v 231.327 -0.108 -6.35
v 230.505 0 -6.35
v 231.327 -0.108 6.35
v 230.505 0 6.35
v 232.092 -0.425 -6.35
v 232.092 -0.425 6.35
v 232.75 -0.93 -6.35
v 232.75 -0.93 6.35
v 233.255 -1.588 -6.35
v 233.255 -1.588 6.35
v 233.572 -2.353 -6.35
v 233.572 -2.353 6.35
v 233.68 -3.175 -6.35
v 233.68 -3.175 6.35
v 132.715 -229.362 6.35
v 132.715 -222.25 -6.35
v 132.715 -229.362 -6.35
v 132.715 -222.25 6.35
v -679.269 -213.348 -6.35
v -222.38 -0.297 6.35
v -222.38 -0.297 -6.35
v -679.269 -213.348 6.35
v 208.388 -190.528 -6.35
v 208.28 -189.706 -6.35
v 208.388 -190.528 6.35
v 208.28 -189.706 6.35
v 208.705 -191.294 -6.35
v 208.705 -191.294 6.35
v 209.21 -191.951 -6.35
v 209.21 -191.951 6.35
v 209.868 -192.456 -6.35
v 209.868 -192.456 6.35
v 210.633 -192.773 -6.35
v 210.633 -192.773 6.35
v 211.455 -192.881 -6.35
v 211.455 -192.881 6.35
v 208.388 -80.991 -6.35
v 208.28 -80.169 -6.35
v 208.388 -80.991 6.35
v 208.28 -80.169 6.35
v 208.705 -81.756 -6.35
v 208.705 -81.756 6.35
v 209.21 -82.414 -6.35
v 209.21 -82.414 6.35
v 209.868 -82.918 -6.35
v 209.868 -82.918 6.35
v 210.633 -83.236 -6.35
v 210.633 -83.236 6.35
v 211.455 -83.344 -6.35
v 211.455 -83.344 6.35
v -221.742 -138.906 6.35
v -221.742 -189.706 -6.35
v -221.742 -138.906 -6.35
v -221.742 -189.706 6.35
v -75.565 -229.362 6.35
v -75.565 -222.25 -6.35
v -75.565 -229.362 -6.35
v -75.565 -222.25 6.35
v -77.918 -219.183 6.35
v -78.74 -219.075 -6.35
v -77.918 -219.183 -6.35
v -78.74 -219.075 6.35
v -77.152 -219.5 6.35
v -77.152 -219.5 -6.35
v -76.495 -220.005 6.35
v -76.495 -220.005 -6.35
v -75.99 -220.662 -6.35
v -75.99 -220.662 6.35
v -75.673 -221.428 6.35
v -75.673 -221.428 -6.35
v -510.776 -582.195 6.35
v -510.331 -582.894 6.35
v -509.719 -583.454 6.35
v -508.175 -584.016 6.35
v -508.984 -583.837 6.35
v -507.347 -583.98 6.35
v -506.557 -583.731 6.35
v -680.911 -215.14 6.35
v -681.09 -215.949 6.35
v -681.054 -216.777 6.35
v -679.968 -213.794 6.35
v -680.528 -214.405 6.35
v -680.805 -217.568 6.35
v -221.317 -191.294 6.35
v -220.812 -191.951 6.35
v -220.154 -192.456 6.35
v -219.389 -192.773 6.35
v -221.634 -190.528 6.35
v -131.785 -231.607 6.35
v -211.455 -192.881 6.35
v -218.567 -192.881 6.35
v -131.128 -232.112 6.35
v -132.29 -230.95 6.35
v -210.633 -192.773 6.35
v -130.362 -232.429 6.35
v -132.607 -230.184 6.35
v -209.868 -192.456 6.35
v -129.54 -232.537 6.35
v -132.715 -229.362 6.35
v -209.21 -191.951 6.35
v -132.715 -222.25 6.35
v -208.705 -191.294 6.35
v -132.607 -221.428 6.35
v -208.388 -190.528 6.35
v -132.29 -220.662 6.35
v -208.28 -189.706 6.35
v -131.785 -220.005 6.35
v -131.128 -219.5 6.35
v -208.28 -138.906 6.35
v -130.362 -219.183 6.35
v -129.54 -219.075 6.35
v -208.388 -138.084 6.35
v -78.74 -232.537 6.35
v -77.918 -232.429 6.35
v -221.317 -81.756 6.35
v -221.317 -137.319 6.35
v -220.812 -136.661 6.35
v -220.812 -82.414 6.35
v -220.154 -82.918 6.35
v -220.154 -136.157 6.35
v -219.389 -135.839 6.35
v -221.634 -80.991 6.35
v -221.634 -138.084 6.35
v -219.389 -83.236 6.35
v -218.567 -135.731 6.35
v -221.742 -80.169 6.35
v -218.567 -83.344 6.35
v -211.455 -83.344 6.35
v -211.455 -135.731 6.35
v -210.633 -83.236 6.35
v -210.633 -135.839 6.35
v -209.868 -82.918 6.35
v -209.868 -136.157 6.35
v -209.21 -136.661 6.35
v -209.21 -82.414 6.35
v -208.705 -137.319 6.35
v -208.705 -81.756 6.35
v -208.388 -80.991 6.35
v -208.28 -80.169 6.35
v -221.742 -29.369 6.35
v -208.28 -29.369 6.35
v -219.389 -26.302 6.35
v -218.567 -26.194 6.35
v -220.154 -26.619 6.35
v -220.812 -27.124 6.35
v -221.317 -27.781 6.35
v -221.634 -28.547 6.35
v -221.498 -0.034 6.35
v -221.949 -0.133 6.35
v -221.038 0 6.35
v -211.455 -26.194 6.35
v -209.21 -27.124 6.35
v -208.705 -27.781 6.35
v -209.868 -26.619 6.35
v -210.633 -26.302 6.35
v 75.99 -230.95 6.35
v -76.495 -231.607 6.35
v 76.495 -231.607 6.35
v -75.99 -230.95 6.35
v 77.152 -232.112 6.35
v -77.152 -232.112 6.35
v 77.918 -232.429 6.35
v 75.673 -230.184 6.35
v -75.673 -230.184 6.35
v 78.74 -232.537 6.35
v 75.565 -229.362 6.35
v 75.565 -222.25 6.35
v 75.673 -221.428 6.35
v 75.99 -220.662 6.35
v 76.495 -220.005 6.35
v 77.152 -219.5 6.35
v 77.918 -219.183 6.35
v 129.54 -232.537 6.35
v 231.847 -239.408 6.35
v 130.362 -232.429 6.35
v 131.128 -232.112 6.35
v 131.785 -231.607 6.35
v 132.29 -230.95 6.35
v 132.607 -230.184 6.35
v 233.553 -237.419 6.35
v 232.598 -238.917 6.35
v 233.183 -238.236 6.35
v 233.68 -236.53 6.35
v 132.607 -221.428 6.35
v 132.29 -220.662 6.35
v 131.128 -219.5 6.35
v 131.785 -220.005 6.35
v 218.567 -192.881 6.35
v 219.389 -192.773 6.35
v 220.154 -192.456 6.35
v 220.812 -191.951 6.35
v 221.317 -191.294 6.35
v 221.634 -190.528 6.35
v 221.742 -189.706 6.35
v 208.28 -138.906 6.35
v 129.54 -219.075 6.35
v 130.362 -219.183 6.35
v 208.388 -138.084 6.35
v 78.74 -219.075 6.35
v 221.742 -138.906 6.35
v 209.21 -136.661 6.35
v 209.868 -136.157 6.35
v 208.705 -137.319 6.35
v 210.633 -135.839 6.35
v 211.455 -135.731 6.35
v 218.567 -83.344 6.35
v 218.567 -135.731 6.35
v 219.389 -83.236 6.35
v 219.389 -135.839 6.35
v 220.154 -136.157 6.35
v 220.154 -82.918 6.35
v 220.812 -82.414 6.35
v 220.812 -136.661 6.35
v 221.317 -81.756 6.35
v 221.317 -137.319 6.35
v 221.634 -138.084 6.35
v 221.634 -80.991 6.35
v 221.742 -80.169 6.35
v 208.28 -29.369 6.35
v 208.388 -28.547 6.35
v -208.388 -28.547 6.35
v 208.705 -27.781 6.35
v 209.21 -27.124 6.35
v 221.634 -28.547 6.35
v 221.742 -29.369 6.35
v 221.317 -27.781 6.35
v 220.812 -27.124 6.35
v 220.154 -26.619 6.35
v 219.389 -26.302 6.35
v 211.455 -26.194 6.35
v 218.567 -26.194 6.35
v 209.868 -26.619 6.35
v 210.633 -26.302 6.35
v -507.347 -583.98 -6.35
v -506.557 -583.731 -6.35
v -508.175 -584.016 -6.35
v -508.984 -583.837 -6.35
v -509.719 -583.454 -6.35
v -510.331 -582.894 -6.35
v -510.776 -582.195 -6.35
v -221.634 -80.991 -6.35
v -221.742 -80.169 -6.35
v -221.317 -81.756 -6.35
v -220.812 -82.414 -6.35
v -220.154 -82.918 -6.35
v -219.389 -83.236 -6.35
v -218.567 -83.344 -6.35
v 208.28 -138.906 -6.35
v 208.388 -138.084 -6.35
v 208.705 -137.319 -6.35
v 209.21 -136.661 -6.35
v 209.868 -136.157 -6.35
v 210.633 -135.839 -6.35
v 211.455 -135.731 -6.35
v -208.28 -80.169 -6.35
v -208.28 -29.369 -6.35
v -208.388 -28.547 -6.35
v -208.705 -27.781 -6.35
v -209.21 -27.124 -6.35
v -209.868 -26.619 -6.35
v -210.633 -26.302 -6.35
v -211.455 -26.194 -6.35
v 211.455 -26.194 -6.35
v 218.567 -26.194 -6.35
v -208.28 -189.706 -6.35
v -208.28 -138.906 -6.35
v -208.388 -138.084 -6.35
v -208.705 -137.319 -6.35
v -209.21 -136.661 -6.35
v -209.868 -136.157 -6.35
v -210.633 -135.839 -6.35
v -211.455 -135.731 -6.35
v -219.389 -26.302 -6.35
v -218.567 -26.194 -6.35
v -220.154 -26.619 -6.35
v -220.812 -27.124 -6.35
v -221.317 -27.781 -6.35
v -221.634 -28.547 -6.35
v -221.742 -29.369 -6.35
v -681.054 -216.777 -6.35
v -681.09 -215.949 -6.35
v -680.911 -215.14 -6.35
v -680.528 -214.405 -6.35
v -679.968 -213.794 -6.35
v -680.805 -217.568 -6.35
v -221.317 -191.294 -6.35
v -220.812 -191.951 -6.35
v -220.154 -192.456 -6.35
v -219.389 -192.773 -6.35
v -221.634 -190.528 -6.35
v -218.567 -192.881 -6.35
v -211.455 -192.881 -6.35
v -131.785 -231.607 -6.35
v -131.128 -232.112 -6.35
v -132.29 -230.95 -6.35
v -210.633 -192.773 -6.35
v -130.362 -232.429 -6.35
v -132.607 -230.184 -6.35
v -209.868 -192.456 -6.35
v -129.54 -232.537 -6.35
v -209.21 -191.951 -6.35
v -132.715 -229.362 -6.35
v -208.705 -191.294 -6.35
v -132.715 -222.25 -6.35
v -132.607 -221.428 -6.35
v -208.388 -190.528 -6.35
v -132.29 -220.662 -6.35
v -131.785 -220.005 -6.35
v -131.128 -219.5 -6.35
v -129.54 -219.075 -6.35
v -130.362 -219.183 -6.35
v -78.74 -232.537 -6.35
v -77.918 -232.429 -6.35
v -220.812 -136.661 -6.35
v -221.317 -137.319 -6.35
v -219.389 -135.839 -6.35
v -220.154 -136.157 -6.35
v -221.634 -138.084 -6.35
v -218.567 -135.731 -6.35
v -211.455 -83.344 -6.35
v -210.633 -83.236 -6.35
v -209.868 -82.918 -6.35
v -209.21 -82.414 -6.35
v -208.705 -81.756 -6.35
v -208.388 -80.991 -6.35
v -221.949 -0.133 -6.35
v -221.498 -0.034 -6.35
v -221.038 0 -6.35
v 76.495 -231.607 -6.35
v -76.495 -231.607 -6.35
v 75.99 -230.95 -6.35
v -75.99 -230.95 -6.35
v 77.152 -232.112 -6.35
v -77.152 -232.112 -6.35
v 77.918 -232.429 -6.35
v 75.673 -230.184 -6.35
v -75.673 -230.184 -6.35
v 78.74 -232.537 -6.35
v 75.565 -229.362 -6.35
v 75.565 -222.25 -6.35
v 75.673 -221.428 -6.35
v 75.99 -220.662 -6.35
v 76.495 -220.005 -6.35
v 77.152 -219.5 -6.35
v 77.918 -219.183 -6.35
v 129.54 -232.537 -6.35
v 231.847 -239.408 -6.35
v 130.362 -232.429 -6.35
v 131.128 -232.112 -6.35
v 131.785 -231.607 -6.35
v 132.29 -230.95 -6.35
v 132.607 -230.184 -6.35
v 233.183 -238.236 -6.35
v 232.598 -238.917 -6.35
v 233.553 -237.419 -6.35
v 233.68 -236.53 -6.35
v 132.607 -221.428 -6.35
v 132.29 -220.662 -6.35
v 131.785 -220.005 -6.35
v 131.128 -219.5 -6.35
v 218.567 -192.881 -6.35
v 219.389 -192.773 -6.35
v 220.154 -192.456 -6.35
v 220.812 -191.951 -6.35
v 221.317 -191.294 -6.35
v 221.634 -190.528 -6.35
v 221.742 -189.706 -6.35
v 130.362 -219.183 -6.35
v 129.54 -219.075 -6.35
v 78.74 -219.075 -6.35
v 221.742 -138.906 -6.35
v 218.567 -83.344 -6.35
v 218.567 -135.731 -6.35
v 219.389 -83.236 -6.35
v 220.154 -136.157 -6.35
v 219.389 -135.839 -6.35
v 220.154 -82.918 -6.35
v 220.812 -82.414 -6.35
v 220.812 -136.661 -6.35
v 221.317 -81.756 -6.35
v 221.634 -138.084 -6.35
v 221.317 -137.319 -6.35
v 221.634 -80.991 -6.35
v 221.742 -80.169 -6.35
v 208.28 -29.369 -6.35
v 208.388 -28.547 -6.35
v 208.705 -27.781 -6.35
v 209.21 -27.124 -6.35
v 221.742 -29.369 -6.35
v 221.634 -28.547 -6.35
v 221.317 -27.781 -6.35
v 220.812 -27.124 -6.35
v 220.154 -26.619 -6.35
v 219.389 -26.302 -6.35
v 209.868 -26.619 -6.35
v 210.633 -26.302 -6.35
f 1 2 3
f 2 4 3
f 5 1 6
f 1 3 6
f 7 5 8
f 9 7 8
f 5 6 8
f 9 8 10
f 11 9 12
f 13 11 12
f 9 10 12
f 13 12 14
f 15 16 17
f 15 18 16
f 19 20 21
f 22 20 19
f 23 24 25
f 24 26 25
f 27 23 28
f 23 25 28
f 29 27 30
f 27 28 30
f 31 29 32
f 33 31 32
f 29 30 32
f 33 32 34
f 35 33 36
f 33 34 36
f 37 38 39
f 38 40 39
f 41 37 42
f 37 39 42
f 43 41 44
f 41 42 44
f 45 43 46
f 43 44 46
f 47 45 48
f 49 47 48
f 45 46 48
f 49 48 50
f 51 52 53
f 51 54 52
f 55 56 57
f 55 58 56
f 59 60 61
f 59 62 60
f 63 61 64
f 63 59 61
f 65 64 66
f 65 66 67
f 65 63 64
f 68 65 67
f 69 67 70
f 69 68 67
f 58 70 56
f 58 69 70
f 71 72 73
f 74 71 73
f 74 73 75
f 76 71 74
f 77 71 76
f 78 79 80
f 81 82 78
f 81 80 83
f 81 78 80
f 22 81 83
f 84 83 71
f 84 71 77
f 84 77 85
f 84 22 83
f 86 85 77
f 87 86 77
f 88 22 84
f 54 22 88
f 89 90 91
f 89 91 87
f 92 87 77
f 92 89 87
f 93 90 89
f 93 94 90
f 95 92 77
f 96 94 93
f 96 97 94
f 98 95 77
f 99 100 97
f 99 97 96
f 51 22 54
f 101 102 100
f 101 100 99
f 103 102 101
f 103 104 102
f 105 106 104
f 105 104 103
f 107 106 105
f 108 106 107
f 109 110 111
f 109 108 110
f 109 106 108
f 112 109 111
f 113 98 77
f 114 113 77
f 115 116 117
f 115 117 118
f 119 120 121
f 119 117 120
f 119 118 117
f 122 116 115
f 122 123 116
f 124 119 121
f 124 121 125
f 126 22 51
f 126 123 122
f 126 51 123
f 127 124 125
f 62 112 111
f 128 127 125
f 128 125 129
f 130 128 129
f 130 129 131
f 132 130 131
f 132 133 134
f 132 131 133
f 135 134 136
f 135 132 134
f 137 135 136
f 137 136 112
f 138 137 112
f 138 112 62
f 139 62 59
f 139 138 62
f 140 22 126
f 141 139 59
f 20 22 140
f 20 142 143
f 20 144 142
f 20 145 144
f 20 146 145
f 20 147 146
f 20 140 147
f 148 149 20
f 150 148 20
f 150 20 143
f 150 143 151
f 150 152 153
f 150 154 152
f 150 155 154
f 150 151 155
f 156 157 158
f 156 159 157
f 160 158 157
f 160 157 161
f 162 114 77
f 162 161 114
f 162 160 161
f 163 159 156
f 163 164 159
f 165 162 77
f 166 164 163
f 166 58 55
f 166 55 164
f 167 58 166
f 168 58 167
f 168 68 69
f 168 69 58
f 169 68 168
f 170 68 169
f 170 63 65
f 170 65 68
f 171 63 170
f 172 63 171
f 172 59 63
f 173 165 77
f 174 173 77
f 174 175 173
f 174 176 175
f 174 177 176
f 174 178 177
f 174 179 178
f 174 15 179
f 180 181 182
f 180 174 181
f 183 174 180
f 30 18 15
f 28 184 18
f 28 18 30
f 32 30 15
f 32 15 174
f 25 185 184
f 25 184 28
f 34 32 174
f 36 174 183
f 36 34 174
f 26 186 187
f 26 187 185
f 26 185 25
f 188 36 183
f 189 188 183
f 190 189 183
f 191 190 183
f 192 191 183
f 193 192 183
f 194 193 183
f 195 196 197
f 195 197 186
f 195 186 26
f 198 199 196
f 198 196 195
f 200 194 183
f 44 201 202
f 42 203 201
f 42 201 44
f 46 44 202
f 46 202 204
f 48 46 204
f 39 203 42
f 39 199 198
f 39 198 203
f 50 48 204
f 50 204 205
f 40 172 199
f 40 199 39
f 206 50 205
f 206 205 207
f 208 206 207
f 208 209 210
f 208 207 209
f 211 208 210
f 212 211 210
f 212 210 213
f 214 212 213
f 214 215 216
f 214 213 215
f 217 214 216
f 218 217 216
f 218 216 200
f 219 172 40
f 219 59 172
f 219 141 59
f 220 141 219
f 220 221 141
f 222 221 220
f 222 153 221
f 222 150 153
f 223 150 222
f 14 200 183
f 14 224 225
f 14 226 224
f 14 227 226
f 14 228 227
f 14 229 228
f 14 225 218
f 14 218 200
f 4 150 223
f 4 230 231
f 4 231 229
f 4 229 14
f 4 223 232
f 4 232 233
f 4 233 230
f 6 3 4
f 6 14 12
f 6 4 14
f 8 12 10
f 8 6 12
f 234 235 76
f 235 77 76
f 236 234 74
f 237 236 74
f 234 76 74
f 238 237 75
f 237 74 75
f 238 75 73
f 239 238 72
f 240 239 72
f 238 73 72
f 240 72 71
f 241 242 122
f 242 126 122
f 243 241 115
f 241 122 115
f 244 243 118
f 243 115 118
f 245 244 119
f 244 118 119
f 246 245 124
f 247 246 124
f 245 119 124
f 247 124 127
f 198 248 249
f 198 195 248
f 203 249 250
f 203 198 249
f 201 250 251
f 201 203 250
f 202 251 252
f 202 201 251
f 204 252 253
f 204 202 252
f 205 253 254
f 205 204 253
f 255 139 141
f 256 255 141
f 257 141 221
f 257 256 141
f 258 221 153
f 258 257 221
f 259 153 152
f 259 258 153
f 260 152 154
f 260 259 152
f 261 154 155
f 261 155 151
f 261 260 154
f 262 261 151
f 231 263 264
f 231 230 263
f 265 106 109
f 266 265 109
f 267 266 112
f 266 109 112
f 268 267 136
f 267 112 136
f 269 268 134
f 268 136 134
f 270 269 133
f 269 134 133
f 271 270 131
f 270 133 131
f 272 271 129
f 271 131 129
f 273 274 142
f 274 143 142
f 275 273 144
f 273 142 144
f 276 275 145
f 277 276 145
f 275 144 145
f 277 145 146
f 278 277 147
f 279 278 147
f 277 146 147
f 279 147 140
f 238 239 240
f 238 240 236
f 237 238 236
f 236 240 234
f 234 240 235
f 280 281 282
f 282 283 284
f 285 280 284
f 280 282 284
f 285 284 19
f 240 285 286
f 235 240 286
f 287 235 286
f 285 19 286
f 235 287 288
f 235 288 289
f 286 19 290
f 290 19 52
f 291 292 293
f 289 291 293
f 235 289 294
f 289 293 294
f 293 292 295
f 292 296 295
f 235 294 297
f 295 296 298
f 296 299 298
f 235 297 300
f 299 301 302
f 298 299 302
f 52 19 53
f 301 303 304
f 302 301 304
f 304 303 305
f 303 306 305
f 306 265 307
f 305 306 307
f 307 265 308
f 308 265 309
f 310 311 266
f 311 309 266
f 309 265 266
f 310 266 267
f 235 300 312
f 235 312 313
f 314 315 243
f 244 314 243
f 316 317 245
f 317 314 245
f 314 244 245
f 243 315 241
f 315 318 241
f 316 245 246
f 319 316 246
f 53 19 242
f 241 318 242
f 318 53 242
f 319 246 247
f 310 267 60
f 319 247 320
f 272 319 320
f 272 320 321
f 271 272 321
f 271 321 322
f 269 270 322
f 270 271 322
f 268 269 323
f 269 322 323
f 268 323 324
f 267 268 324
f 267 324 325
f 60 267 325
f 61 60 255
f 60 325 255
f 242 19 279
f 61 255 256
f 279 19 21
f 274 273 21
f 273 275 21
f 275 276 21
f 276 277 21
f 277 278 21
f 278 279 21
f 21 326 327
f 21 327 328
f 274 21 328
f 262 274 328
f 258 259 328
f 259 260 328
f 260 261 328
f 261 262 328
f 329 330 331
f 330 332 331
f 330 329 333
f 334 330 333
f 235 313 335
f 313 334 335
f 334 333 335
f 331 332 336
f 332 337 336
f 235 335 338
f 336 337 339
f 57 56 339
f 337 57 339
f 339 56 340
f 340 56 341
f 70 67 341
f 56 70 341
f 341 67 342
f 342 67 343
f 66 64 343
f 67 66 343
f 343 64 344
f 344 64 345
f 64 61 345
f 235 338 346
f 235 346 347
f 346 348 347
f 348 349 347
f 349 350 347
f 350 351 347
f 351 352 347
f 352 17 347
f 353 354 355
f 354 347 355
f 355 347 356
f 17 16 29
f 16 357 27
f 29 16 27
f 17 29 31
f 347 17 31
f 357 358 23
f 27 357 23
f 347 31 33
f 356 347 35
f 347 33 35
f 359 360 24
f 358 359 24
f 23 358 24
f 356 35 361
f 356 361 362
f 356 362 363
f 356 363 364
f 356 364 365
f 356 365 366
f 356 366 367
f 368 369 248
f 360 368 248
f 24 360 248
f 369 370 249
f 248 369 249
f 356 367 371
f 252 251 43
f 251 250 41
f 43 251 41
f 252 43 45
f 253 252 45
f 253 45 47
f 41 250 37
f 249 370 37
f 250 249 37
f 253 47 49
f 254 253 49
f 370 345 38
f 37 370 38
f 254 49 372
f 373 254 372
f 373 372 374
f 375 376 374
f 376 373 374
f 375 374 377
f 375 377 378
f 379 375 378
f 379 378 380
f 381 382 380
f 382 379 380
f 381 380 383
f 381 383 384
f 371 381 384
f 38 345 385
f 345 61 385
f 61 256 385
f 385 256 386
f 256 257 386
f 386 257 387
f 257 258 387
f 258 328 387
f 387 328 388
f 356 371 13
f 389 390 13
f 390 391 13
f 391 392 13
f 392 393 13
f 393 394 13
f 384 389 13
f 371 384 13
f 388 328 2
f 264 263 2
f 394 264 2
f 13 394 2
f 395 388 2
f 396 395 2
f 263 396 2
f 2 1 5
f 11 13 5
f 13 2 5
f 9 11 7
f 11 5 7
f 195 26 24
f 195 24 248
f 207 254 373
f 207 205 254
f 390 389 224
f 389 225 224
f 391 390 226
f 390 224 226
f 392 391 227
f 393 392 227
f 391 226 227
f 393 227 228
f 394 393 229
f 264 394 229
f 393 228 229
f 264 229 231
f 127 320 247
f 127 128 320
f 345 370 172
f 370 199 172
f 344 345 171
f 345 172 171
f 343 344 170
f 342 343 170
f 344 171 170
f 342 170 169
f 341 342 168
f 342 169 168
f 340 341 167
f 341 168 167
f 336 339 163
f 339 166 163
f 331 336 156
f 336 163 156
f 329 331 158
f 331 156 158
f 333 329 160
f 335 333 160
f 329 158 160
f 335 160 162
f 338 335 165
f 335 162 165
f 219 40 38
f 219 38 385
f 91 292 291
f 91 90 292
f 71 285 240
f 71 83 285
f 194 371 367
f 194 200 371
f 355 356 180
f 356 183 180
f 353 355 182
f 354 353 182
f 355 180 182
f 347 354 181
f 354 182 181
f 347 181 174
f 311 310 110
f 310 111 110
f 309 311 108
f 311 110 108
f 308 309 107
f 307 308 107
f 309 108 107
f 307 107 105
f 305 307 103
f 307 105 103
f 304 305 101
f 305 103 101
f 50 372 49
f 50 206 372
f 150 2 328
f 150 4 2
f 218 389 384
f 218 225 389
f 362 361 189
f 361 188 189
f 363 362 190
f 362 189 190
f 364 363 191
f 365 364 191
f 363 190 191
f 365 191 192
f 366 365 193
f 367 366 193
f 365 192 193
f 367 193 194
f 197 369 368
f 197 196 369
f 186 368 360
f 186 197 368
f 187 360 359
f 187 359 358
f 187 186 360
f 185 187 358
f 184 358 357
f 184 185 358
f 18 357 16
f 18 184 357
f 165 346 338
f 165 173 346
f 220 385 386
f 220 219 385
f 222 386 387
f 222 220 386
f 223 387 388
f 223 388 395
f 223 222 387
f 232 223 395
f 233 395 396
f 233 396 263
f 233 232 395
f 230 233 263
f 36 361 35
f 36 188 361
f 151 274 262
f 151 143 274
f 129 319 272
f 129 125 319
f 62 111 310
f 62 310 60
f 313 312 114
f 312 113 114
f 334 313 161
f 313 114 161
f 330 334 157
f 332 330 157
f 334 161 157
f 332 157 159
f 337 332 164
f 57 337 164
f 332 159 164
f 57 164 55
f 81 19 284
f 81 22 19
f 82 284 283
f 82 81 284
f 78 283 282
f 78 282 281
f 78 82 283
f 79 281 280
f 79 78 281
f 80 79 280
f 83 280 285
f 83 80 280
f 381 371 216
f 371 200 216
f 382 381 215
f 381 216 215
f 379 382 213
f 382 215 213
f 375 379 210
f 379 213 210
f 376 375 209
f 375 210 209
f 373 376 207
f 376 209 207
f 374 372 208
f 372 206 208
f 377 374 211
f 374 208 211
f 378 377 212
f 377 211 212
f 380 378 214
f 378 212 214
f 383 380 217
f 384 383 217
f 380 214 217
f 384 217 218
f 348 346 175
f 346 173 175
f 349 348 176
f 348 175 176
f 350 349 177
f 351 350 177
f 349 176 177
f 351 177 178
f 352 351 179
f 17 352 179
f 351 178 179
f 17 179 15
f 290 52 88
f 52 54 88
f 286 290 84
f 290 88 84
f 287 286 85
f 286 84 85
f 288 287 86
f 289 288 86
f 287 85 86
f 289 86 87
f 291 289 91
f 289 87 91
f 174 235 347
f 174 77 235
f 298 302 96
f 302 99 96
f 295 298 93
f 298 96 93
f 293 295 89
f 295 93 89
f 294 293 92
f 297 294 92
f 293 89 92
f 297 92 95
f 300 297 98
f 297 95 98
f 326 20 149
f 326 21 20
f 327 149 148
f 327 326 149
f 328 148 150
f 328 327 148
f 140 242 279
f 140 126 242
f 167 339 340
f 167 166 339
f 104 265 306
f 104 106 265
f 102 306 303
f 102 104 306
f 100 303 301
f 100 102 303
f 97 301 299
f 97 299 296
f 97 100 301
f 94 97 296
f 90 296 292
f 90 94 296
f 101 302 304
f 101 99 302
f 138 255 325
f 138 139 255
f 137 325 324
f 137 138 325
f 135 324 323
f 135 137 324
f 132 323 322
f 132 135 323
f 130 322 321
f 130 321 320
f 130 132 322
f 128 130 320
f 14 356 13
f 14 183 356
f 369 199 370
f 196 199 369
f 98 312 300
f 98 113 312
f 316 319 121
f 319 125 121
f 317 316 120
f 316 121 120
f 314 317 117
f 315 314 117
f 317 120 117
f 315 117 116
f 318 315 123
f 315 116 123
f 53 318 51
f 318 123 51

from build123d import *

# Parameters (mm, degrees)
SKETCH1_W           = 416.56
SKETCH1_H           = 219.075
BOSS_EXTRUDE1_DEPTH = 6.35
BOSS_EXTRUDE2_DEPTH = 6.35
FILLET1_R           = 3.175


with BuildPart() as part:
    # Sketch1 → Boss-Extrude1 (new body, symmetric)
    with BuildSketch(Plane.XY):
        with Locations((0, -109.5375)):
            Rectangle(SKETCH1_W, SKETCH1_H)
    extrude(amount=BOSS_EXTRUDE1_DEPTH, both=True)

    # Sketch2 → Boss-Extrude2 (add, symmetric)
    with BuildSketch(Plane.XY):
        Polygon((-221.742, 0), (-682.146355815, -214.690076964), (-509.434106267, -585.072691377), (233.68, -238.552892741), (233.68, 0), (208.28, 0), (208.28, -26.19375), (221.742, -26.19375), (221.742, -83.34375), (208.28, -83.34375), (208.28, -135.73125), (221.742, -135.73125), (221.742, -192.88125), (208.28, -192.88125), (208.28, -219.075), (132.715, -219.075), (132.715, -232.537), (75.565, -232.537), (75.565, -219.075), (-75.565, -219.075), (-75.565, -232.537), (-132.715, -232.537), (-132.715, -219.075), (-208.28, -219.075), (-208.28, -192.88125), (-221.742, -192.88125), (-221.742, -135.73125), (-208.28, -135.73125), (-208.28, -83.34375), (-221.742, -83.34375), (-221.742, -26.19375), (-208.28, -26.19375), (-208.28, 0), align=None)
    extrude(amount=BOSS_EXTRUDE2_DEPTH, both=True)

    # Fillet1
    fillet1_edges = [part.edges().sort_by_distance(p)[0] for p in [
        (-682.146355815, -214.690076964, 0),
        (-509.434106267, -585.072691377, 0),
        (233.68, -238.552892741, 0),
        (233.68, 0, 0),
        (208.28, -26.19375, 0),
        (221.742, -26.19375, 0),
        (221.742, -83.34375, 0),
        (208.28, -83.34375, 0),
        (208.28, -135.73125, 0),
        (221.742, -135.73125, 0),
        (221.742, -192.88125, 0),
        (208.28, -192.88125, 0),
        (132.715, -219.075, 0),
        (132.715, -232.537, 0),
        (75.565, -232.537, 0),
        (75.565, -219.075, 0),
        (-75.565, -219.075, 0),
        (-75.565, -232.537, 0),
        (-132.715, -232.537, 0),
        (-132.715, -219.075, 0),
        (-208.28, -192.88125, 0),
        (-221.742, -192.88125, 0),
        (-221.742, -135.73125, 0),
        (-208.28, -135.73125, 0),
        (-208.28, -83.34375, 0),
        (-221.742, -83.34375, 0),
        (-221.742, -26.19375, 0),
        (-208.28, -26.19375, 0),
        (-221.742, 0, 0),
    ]]
    fillet(fillet1_edges, radius=FILLET1_R)


solid = part.part
